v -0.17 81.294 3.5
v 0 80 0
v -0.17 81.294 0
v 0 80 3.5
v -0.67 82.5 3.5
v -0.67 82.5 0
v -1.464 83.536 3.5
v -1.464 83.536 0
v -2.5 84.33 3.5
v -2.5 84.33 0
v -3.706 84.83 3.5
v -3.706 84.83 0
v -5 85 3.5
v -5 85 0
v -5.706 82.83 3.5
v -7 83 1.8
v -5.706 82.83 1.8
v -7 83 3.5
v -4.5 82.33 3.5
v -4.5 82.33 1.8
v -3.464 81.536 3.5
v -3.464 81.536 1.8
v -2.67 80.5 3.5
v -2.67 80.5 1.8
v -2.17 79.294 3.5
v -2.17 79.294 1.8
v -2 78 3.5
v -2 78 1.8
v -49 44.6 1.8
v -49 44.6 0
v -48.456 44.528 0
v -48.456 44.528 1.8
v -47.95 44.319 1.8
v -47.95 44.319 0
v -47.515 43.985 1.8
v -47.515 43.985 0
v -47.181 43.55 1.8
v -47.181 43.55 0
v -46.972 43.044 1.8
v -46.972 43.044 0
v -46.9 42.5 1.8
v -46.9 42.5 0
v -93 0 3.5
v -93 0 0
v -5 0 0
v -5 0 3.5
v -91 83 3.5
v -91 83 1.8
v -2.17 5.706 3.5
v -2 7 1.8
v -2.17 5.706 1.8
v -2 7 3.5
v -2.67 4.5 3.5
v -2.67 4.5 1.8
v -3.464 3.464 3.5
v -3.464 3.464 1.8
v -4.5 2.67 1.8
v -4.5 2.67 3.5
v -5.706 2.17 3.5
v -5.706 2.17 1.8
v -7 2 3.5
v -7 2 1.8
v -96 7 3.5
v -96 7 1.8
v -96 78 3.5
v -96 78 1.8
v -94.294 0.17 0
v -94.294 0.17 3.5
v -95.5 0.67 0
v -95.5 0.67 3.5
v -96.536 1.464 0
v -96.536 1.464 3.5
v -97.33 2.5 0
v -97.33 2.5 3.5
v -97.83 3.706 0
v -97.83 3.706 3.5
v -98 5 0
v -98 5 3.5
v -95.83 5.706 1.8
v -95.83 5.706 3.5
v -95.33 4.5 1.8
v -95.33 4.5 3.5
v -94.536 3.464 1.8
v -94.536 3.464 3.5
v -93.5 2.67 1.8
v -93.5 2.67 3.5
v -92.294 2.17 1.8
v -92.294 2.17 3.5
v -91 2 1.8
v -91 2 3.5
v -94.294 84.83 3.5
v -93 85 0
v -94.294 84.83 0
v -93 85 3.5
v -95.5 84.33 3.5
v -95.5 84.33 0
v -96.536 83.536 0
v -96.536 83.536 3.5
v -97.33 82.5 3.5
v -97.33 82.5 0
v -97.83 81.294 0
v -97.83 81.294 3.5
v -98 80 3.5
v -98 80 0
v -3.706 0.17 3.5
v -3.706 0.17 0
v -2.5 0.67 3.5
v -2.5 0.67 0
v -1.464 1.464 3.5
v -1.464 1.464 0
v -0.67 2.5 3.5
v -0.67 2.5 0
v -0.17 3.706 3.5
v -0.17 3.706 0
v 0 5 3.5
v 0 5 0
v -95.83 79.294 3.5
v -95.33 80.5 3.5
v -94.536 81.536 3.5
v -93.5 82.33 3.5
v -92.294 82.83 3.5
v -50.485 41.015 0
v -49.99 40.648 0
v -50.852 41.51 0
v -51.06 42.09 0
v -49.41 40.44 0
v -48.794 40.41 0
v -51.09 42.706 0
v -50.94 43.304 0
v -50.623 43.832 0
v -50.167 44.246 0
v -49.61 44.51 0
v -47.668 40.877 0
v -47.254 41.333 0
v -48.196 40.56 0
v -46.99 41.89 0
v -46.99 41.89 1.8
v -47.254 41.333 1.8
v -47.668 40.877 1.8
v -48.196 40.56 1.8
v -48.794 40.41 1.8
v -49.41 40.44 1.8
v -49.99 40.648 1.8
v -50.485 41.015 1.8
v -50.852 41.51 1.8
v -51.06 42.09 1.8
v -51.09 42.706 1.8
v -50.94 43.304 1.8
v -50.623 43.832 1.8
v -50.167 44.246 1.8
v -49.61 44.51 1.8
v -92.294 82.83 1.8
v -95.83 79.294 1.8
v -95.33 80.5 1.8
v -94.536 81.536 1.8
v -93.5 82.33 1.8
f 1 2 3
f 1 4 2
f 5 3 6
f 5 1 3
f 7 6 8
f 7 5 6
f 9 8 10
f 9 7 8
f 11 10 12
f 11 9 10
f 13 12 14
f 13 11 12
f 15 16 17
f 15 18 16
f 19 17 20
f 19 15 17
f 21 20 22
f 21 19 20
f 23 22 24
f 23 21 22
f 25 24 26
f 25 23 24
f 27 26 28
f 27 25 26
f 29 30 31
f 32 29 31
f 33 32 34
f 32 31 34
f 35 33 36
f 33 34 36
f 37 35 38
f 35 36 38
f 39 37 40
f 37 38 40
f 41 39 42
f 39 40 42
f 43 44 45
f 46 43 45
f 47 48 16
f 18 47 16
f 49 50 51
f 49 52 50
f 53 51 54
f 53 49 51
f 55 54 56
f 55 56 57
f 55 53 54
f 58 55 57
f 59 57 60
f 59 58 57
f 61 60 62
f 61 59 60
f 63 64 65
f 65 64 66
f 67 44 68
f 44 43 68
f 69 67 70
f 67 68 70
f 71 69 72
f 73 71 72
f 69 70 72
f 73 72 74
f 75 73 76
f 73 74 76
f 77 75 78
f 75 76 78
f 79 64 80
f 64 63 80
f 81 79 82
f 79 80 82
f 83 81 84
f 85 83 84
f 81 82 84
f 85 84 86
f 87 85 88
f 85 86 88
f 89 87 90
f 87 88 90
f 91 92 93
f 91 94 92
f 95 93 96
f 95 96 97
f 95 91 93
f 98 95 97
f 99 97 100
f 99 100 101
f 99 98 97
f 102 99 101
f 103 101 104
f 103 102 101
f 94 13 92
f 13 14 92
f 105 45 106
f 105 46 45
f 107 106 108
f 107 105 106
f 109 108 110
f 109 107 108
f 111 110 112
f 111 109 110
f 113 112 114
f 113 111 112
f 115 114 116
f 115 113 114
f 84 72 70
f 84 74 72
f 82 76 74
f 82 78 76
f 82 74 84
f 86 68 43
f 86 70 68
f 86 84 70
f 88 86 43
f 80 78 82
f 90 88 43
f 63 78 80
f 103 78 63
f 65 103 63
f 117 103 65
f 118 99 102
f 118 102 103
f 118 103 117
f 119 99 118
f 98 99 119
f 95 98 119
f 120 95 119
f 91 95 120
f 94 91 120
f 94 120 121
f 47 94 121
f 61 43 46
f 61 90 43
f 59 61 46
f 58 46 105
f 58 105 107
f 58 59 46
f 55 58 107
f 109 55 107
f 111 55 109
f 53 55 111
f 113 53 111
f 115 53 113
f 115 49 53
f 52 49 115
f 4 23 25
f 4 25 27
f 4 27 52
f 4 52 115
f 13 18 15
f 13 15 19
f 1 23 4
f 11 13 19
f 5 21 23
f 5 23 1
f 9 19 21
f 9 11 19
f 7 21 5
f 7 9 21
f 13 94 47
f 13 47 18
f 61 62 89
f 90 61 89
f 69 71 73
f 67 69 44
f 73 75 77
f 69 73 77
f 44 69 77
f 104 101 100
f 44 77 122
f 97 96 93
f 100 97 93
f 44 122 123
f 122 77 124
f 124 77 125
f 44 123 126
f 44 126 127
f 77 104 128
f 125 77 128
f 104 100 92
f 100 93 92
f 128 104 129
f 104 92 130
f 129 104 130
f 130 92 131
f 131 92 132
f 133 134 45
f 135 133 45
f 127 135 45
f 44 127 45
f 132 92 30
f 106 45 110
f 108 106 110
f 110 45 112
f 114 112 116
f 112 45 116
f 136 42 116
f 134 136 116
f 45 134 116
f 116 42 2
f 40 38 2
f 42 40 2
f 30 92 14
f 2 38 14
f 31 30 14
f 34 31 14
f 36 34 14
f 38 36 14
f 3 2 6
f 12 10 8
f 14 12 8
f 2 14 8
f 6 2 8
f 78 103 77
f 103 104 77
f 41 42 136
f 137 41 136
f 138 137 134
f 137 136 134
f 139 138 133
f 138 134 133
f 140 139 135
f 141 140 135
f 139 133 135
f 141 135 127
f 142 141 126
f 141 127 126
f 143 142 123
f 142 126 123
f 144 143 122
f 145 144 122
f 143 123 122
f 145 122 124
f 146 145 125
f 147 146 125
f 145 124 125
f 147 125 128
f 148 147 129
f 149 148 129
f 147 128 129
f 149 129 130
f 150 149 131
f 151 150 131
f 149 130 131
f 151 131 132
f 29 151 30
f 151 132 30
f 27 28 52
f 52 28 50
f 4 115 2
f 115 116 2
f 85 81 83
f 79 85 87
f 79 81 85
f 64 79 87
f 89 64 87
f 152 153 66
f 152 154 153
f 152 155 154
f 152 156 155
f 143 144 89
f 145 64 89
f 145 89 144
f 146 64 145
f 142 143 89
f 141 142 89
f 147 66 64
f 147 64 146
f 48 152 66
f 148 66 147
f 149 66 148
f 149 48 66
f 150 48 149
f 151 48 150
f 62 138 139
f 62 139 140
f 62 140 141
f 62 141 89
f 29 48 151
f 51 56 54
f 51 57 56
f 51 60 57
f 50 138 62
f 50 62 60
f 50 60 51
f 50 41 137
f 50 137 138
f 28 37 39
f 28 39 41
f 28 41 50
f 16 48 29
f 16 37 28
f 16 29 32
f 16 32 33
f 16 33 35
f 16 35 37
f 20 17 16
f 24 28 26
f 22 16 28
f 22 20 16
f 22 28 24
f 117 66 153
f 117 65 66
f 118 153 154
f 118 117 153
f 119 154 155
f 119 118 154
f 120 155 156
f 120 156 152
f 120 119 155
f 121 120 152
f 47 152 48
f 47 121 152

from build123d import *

# Parameters (mm, degrees)
F1_DEPTH = 1.8
F2_R     = 5
F3_DEPTH = 3.5
F4_R     = 5
F5_R     = 5


# Not quite as in the source:
# - a feature names something its author has since deleted; it is built from what else it names


with BuildPart() as f1:
    # F0 (on Top) → F1 (new body)
    with BuildSketch(Plane.XY):
        Polygon((-98, 0), (0, 0), (0, 85), (-49, 85), (-98, 85), align=None)
        Polygon((-96, 83), (-49, 83), (-2, 83), (-2, 2), (-96, 2), align=None, mode=Mode.SUBTRACT)
        Polygon((-2, 83), (-49, 83), (-96, 83), (-96, 2), (-2, 2), align=None)
        with BuildLine():
            ThreePointArc((-46.9, 42.5), (-50.4849242405, 41.0150757595), (-49, 44.6))
            ThreePointArc((-49, 44.6), (-47.5150757595, 43.9849242405), (-46.9, 42.5))
        make_face(mode=Mode.SUBTRACT)
    extrude(amount=F1_DEPTH)

    # F2
    f2_edges = [f1.edges().sort_by_distance(p)[0] for p in [
        (-98, 85, 0.9),
        (-98, 0, 0.9),
        (0, 0, 0.9),
        (0, 85, 0.9),
    ]]
    fillet(f2_edges, radius=F2_R)

    # F0 (on Top) → F3 (join)
    with BuildSketch(Plane.XY):
        Polygon((-98, 0), (0, 0), (0, 85), (-49, 85), (-98, 85), align=None)
        Polygon((-96, 83), (-49, 83), (-2, 83), (-2, 2), (-96, 2), align=None, mode=Mode.SUBTRACT)
    extrude(amount=F3_DEPTH)

    # F4
    f4_edges = [f1.edges().sort_by_distance(p)[0] for p in [
        (0, 85, 1.75),
        (0, 0, 1.75),
        (-98, 0, 1.75),
        (-98, 85, 1.75),
    ]]
    fillet(f4_edges, radius=F4_R)

    # F5
    f5_edges = [f1.edges().sort_by_distance(p)[0] for p in [
        (-96, 83, 2.65),
        (-96, 2, 2.65),
        (-2, 83, 2.65),
        (-2, 2, 2.65),
    ]]
    fillet(f5_edges, radius=F5_R)


solid = f1.part
